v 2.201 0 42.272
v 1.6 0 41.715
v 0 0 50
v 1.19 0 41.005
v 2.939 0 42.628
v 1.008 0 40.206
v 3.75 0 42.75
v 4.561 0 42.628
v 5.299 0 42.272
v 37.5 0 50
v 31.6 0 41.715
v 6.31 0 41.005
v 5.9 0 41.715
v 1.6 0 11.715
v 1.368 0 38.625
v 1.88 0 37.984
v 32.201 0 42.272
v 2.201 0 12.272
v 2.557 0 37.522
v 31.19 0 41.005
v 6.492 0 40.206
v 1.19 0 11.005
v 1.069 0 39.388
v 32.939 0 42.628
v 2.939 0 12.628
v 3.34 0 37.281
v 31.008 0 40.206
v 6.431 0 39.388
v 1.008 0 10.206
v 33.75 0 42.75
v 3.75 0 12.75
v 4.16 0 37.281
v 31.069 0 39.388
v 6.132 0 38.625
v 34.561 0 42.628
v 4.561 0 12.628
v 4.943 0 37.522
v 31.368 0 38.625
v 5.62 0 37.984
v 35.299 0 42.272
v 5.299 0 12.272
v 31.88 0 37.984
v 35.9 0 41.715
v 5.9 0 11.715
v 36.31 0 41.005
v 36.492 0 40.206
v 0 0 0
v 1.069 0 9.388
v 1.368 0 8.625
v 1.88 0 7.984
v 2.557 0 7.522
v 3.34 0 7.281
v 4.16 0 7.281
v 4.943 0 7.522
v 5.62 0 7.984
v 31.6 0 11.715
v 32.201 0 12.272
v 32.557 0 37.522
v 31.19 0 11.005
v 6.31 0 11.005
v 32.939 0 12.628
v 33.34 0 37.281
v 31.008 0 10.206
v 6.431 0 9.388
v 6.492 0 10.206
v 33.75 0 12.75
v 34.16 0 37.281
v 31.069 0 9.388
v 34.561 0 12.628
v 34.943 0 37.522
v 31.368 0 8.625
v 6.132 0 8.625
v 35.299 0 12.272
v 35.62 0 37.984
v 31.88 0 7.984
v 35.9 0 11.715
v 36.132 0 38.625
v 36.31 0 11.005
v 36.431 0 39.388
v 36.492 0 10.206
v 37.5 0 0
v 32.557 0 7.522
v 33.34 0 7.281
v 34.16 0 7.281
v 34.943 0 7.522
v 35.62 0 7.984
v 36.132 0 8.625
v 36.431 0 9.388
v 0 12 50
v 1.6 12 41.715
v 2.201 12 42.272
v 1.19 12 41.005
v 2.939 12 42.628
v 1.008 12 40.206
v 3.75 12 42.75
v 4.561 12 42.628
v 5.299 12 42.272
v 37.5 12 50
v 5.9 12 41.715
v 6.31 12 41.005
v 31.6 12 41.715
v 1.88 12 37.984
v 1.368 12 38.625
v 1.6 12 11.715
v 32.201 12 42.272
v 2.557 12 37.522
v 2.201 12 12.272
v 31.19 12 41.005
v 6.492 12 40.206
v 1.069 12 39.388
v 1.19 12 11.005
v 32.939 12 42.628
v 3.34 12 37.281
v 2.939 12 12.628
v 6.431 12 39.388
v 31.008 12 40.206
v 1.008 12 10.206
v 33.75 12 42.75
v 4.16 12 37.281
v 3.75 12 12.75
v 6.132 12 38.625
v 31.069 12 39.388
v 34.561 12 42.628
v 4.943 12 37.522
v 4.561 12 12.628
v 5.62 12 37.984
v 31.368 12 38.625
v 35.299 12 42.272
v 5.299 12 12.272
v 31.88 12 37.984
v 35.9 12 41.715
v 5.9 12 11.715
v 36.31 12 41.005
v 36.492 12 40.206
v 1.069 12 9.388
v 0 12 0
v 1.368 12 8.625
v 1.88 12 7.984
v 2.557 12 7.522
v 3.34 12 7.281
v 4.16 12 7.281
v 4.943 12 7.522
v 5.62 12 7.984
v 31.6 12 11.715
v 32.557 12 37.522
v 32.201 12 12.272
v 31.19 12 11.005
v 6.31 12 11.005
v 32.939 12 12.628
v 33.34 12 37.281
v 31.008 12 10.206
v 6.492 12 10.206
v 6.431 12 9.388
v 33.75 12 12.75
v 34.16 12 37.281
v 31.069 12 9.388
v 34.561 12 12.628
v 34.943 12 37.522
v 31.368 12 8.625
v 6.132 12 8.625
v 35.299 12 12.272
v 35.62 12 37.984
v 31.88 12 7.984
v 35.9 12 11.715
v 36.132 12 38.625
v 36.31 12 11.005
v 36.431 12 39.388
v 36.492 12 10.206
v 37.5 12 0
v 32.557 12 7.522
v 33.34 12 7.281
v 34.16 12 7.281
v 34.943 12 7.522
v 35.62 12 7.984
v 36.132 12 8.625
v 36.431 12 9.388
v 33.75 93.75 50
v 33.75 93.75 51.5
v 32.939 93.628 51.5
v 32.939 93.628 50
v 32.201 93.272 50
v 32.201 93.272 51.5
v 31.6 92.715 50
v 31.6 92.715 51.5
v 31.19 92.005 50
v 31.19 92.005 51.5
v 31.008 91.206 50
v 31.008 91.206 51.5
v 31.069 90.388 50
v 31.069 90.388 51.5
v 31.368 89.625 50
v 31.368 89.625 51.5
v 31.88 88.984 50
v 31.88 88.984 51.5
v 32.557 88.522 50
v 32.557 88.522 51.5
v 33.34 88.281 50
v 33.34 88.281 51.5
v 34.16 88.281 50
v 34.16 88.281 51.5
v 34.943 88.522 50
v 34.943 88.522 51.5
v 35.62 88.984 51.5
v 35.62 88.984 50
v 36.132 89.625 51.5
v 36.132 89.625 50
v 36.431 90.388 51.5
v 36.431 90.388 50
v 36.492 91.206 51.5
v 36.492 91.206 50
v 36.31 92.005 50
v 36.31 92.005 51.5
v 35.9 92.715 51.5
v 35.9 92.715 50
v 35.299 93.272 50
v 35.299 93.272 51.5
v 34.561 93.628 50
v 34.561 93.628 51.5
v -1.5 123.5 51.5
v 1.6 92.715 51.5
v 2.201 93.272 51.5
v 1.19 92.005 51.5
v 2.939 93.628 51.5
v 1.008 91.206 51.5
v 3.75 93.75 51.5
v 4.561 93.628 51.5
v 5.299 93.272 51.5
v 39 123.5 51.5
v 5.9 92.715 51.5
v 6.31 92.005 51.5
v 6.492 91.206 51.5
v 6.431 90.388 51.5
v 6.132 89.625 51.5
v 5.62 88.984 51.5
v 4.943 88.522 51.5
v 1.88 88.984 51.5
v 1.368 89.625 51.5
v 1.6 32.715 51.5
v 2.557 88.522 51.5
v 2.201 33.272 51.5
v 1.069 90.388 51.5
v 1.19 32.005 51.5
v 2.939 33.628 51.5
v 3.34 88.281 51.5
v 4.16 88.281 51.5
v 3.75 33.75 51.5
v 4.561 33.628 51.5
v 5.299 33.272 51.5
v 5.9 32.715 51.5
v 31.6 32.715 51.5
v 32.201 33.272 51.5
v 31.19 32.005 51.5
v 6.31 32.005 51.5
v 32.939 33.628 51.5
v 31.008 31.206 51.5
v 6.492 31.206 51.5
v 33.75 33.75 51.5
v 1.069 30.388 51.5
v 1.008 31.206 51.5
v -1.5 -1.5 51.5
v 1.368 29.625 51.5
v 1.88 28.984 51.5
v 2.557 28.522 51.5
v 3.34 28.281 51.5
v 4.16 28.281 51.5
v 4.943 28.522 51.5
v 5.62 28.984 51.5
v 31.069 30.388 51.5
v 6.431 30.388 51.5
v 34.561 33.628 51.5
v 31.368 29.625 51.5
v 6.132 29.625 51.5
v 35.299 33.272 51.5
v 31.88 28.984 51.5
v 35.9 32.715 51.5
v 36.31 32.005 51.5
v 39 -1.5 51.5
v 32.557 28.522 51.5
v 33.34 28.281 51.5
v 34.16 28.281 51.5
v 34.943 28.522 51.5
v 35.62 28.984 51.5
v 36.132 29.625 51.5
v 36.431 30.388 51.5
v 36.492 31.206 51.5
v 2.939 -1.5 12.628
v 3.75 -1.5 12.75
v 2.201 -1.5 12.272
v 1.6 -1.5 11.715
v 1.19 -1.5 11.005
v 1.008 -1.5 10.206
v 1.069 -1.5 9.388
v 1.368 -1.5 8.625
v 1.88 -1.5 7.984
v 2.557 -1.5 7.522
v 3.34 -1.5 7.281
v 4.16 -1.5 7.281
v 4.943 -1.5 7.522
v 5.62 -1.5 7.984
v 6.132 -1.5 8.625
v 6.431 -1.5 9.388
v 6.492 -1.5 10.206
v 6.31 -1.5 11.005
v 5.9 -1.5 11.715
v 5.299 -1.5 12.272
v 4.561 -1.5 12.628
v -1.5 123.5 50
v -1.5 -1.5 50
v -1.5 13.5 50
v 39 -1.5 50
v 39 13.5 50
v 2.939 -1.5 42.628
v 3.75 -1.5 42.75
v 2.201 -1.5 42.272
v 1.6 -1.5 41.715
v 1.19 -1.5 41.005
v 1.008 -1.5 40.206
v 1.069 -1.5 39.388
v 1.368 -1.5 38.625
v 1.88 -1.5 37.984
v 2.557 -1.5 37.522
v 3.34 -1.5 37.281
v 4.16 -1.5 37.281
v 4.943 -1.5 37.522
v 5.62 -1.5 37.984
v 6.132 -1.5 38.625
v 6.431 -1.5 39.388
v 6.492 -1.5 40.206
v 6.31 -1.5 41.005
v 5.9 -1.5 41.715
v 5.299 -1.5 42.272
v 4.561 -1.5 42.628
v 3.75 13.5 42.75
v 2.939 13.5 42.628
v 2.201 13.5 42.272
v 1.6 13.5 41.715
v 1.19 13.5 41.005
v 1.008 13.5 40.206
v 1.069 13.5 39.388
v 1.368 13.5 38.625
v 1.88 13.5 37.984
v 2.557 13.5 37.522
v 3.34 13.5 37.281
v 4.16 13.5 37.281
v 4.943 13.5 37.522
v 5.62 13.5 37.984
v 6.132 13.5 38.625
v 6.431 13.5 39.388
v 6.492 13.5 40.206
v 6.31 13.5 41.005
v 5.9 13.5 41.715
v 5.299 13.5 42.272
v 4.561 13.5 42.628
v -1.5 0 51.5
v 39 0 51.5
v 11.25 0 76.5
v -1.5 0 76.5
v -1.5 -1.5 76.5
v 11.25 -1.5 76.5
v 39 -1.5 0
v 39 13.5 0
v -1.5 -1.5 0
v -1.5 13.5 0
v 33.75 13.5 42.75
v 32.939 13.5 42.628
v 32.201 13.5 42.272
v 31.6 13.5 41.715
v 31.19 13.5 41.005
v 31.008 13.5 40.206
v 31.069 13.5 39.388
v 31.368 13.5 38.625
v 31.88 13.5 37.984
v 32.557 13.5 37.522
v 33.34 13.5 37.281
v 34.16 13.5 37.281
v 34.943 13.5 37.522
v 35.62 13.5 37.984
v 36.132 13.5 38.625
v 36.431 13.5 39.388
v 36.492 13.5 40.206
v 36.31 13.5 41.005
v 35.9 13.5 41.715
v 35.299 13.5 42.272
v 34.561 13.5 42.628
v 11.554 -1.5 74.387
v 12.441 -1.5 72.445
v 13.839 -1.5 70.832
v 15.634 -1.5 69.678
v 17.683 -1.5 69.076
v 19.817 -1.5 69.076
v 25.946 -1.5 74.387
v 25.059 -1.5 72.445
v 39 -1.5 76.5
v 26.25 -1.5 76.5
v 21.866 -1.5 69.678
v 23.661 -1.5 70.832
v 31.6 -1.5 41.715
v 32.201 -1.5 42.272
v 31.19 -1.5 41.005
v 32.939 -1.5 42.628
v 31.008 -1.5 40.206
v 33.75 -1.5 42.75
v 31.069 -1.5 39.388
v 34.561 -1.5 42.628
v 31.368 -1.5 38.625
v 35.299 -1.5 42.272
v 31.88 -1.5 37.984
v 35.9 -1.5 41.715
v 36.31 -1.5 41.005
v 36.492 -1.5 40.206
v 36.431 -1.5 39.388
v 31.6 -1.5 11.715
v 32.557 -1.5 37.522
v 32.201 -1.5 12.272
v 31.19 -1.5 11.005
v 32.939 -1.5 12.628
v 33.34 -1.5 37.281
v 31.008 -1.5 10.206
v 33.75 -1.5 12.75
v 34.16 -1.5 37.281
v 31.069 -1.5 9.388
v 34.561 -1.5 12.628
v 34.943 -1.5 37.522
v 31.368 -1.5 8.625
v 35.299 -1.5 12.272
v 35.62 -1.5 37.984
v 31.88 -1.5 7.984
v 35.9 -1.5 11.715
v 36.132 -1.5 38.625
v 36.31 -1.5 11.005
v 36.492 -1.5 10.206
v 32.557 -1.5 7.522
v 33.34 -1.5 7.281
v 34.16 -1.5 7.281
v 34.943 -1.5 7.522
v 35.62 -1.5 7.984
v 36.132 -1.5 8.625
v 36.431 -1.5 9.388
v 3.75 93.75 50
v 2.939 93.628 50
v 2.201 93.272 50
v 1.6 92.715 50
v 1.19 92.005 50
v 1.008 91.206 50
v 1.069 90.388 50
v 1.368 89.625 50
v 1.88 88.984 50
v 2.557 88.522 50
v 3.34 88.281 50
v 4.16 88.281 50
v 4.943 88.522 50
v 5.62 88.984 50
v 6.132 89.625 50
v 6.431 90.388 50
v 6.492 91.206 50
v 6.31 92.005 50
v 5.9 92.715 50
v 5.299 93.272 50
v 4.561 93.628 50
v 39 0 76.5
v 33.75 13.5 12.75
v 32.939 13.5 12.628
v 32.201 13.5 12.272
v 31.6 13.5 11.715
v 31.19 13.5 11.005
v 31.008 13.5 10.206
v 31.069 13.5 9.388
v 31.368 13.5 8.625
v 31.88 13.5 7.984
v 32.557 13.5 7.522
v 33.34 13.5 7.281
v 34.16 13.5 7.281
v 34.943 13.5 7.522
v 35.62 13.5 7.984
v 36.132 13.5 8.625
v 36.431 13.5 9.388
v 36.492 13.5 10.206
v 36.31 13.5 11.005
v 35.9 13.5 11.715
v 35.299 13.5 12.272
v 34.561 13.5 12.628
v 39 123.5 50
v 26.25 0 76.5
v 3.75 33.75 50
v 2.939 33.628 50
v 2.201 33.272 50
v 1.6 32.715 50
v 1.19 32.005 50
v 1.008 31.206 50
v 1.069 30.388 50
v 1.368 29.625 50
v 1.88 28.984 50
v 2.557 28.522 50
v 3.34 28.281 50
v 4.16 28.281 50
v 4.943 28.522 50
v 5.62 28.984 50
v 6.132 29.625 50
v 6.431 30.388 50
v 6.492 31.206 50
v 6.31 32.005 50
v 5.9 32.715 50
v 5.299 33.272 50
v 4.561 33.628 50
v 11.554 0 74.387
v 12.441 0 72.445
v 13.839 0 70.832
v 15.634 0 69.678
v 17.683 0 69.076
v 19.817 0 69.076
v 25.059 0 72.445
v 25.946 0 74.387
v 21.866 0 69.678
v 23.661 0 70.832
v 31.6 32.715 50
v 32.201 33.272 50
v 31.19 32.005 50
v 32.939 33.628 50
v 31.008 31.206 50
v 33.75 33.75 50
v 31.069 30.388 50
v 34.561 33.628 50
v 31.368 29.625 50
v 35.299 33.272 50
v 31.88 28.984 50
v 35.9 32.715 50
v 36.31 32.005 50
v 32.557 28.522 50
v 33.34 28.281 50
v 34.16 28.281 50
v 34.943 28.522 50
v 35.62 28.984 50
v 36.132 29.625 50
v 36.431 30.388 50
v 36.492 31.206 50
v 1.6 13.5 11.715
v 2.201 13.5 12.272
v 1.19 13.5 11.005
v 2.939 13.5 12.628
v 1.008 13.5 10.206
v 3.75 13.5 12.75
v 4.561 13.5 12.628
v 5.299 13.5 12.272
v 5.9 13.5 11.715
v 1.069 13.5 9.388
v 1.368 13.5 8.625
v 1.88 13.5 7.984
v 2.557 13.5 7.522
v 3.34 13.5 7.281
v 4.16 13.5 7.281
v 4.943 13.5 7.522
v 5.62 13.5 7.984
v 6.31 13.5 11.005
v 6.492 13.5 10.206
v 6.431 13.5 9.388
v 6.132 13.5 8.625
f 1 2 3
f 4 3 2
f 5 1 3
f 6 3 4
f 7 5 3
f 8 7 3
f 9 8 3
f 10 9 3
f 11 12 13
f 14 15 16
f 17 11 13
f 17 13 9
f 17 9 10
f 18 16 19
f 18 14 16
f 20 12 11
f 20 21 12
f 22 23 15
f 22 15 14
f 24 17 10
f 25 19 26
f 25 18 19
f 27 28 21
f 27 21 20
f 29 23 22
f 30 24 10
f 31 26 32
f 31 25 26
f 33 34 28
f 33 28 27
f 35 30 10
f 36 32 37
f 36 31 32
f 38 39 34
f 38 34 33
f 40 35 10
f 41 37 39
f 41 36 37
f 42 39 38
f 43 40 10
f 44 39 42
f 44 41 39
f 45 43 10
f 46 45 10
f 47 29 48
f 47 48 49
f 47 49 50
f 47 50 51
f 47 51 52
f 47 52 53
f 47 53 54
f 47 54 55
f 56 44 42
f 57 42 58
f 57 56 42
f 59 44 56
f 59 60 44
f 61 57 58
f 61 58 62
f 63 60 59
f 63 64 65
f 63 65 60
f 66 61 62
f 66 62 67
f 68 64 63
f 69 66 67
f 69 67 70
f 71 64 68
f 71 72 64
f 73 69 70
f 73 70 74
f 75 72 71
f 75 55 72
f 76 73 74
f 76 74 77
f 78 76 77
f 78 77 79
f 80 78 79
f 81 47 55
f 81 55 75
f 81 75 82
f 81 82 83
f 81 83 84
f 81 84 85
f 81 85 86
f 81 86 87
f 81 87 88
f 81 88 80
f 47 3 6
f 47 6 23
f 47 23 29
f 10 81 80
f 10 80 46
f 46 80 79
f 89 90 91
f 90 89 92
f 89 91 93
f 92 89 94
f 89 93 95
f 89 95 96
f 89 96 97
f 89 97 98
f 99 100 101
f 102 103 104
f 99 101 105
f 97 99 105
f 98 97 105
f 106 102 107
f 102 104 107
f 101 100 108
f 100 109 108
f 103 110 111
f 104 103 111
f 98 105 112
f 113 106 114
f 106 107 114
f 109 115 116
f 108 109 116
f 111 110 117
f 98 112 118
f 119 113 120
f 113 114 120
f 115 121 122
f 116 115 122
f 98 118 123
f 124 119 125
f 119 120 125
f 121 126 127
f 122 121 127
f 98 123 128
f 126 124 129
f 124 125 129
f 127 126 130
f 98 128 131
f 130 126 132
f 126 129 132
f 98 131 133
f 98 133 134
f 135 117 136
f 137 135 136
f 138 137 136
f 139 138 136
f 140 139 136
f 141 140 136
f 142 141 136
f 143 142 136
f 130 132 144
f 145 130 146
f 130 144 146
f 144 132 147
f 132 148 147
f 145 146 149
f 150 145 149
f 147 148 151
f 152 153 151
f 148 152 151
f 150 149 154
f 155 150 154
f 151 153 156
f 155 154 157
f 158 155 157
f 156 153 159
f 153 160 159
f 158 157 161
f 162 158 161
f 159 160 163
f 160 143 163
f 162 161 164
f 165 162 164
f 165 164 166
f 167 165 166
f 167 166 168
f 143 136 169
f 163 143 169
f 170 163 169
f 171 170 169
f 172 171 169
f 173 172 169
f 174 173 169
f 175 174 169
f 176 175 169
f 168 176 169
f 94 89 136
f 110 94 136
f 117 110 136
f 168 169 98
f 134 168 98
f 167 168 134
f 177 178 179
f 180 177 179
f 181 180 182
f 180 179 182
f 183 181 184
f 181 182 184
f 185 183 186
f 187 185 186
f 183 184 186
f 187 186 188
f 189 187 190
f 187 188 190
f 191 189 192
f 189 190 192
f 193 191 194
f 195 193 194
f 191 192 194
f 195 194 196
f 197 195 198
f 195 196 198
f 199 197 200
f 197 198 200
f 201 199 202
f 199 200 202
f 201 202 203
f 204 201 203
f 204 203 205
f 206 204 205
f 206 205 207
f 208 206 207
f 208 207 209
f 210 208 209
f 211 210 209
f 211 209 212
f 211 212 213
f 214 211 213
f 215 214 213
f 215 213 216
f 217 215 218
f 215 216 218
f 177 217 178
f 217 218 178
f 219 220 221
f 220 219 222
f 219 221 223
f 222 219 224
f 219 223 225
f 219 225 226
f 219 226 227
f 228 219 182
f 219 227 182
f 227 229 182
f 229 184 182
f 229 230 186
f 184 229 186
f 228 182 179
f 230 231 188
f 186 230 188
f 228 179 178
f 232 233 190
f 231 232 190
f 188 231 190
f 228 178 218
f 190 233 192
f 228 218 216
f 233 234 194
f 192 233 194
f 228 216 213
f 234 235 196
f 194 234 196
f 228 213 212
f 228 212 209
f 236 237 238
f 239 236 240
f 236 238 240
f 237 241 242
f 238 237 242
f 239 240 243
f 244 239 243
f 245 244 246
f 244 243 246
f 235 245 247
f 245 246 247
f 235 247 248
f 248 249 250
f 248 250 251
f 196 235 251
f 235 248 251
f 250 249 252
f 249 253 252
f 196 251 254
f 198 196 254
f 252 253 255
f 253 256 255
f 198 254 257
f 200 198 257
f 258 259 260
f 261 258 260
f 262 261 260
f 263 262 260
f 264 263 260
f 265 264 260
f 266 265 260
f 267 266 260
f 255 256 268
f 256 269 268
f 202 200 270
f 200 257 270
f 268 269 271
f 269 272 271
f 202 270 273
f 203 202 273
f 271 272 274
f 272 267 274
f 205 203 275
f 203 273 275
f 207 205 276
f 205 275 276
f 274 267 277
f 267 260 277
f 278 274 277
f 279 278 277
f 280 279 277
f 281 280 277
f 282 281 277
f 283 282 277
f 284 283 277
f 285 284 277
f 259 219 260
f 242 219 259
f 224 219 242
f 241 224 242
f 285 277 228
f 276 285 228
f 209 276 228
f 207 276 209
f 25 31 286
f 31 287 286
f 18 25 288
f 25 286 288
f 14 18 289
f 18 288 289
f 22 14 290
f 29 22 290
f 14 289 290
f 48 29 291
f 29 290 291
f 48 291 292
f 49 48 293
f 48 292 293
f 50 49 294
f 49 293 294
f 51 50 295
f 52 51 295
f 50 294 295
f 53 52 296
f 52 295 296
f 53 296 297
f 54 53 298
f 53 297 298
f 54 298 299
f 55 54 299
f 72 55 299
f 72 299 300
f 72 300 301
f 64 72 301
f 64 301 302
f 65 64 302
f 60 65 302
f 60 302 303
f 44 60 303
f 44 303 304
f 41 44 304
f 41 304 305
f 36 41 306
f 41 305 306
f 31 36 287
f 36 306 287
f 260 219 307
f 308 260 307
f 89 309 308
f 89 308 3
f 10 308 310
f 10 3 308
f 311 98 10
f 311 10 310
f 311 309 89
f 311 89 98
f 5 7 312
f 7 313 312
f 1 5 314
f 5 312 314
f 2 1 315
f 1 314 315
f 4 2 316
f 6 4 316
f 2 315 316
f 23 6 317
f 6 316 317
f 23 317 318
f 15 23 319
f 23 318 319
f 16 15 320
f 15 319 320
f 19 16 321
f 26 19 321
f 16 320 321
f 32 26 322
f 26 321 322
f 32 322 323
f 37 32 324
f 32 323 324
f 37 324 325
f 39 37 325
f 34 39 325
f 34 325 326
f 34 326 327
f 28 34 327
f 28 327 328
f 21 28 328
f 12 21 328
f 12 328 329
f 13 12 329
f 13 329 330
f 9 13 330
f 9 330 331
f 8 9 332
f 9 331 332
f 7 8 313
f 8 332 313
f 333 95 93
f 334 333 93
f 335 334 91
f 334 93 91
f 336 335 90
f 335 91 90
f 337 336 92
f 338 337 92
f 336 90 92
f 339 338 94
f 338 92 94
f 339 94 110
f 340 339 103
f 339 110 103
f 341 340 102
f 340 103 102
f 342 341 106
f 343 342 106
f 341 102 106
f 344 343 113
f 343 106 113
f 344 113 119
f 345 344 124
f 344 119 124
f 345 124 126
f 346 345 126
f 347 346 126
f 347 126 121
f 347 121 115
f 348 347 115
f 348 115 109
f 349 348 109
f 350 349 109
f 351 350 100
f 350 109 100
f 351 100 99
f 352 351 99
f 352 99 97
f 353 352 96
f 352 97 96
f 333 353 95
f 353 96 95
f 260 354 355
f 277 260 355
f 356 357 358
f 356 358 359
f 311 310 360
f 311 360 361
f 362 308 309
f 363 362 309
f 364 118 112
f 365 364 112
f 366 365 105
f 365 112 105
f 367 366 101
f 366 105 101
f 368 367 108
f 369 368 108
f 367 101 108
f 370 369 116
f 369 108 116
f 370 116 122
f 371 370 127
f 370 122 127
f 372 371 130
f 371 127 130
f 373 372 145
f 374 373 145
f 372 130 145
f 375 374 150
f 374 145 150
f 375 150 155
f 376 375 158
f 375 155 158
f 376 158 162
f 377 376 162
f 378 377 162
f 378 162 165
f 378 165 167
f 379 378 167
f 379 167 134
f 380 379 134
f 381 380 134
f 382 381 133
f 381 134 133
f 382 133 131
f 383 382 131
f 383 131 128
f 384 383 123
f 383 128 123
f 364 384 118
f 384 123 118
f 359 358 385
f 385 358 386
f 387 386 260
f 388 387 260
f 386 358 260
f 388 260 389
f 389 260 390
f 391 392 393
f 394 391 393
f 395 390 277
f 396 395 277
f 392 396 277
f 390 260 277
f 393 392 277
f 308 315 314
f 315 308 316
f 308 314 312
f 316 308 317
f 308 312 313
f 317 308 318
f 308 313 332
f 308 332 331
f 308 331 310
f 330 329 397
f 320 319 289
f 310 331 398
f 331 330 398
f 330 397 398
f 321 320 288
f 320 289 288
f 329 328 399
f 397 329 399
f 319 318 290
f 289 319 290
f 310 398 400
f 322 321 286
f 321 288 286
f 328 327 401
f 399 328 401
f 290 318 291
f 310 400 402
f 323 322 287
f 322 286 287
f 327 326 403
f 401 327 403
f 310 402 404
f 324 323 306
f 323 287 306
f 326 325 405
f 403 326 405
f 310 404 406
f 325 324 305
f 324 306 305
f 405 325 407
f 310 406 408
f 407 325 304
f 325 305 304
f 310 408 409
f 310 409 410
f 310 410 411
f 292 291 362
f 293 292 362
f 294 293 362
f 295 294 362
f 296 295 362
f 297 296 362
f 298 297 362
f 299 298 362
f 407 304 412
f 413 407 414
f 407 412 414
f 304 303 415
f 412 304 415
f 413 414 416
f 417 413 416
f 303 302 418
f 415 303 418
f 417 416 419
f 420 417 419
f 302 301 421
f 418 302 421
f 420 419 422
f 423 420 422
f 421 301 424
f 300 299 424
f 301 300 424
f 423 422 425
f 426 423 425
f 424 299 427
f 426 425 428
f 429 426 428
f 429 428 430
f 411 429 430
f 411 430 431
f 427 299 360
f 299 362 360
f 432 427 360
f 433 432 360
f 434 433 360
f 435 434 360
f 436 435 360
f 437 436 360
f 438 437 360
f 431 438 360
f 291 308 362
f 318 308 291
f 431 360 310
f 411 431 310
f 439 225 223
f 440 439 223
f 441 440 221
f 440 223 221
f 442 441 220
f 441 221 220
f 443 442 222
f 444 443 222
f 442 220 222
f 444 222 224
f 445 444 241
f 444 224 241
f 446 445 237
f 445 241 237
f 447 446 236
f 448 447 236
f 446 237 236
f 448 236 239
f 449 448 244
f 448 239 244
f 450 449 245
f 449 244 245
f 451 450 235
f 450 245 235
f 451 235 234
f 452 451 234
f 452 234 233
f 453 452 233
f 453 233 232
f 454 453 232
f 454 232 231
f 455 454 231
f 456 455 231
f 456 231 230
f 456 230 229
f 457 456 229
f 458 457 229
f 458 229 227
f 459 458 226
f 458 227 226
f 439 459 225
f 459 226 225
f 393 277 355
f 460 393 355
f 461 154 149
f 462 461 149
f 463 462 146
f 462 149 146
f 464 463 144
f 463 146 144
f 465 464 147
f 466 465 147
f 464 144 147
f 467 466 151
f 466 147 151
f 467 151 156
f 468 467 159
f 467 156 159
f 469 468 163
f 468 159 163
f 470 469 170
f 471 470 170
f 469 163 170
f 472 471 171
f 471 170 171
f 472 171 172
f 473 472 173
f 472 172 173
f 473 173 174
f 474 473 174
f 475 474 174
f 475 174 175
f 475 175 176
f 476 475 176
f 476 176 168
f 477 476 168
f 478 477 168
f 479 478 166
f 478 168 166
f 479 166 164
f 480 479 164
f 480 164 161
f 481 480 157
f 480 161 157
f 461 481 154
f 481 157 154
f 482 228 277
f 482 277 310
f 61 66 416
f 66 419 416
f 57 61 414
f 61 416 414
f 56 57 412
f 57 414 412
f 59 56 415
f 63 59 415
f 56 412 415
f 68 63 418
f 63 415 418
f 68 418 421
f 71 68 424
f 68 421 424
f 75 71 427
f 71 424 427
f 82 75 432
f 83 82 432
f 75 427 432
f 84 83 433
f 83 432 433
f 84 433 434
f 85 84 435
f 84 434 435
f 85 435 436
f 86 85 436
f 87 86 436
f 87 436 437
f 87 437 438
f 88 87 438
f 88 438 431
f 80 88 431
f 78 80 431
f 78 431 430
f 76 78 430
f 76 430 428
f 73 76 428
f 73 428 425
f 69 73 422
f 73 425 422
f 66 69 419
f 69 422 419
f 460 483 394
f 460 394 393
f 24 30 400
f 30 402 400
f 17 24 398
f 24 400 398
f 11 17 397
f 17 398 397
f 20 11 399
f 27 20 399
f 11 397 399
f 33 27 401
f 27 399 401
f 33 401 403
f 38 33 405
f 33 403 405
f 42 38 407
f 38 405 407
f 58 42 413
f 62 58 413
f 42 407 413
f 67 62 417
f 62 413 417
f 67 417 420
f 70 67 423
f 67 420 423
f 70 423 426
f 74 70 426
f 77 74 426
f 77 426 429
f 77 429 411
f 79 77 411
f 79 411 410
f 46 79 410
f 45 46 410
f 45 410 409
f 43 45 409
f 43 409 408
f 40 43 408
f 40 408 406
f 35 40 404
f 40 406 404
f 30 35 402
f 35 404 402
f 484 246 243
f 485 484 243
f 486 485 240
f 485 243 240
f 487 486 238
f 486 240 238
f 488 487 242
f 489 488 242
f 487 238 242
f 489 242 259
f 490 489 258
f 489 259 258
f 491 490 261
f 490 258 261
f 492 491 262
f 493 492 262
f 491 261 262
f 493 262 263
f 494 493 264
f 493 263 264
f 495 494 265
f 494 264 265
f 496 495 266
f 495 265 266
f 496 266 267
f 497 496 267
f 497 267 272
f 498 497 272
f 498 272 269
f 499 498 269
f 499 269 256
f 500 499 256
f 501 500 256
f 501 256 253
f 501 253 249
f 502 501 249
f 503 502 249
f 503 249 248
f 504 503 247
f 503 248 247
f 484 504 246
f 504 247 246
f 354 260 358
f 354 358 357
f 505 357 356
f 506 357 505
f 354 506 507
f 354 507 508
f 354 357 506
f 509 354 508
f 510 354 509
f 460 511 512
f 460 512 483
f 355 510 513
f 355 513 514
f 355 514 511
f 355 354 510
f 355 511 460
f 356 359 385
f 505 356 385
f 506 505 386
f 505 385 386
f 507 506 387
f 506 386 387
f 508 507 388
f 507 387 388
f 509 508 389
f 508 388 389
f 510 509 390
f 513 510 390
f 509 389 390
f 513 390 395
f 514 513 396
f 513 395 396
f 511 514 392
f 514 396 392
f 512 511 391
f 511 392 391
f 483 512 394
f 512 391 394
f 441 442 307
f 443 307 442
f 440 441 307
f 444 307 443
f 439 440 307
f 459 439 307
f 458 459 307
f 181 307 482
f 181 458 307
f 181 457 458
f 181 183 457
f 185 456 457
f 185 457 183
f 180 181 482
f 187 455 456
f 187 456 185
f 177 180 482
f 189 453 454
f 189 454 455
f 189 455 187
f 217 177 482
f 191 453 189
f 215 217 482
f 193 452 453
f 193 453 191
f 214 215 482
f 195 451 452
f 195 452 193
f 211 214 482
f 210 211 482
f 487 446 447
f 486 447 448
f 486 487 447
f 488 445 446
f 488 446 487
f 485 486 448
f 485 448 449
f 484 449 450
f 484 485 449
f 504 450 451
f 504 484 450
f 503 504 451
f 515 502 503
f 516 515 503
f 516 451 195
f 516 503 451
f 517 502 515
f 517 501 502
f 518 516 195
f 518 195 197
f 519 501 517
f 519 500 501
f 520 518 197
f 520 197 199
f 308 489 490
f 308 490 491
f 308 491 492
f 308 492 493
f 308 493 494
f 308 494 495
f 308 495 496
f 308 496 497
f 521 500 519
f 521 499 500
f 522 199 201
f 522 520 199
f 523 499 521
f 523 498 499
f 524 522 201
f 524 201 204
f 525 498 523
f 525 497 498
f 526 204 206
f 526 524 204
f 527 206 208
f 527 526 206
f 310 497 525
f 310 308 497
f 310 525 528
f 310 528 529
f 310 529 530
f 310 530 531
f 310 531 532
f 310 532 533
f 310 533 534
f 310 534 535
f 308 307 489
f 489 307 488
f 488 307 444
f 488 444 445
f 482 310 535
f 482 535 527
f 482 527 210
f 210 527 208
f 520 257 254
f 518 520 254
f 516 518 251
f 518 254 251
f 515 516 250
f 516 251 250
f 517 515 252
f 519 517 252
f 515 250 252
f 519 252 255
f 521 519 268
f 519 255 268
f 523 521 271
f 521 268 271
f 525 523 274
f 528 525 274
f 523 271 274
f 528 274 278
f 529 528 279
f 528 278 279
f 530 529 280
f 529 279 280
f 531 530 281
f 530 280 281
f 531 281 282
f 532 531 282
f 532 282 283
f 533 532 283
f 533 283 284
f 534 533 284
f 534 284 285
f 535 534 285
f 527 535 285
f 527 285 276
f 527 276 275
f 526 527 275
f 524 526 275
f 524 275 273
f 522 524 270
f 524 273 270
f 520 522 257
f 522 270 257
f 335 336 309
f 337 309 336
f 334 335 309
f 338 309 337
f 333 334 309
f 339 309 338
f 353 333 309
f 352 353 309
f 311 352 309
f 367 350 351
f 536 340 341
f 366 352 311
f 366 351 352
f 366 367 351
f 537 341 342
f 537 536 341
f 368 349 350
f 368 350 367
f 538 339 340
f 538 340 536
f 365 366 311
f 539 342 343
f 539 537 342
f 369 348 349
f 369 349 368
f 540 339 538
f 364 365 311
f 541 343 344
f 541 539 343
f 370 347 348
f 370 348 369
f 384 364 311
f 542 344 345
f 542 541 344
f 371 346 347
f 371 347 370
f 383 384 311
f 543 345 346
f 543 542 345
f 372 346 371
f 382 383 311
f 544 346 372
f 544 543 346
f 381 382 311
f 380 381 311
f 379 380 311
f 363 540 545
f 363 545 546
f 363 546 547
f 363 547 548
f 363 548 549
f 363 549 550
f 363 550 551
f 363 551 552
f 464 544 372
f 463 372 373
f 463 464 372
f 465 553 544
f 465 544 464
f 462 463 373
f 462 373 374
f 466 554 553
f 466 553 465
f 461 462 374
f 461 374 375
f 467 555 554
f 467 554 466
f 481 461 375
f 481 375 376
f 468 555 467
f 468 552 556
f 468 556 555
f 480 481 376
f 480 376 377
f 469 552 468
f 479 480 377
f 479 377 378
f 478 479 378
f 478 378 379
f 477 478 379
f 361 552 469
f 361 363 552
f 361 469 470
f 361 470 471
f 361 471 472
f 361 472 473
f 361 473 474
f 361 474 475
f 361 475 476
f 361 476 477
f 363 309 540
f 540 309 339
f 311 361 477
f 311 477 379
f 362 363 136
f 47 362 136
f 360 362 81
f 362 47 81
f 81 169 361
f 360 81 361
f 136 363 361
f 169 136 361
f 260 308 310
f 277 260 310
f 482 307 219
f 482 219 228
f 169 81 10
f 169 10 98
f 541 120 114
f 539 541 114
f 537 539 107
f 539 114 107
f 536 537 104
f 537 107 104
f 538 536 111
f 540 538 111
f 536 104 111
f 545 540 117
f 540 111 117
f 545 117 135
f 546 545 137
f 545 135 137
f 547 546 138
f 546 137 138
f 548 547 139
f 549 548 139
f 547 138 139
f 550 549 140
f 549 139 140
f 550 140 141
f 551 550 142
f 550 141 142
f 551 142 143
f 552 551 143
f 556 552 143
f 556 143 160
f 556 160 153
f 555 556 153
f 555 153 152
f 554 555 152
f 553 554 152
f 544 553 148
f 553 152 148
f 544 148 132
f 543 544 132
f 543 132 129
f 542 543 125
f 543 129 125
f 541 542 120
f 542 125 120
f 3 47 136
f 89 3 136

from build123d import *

# Parameters (mm, degrees)
SKETCH2_W                       = 40.5
SKETCH2_H                       = 15
SKETCH2_W_2                     = 37.5
SKETCH2_H_2                     = 12
TUBE_CANTILEVER_DEPTH           = 50
SKETCH4_W                       = 40.5
SKETCH4_H                       = 1.5
FLANGE_LEG_DEPTH                = 125
SKETCH5_W                       = 40.5
SKETCH5_H                       = 1.5
BOTTOM_LEG_DEPTH                = 25
SKETCH6_R                       = 7.5
LEADSCREW_CLEARANCE_DEPTH       = 25
SKETCH8_W                       = 2.75
SKETCH8_H                       = 15
DESKTOP_HOLE_PATTERN_AT_2_COUNT = 2
DESKTOP_HOLE_PATTERN_AT_2_PITCH = 42.426406871
DESKTOP_HOLE_PATTERN_AT_3_COUNT = 2
DESKTOP_HOLE_PATTERN_AT_3_PITCH = 30
DESKTOP_HOLE_PATTERN_AT_4_COUNT = 2
DESKTOP_HOLE_PATTERN_AT_4_PITCH = 30
SKETCH10_W                      = 2.75
SKETCH10_H                      = 26.5
BEARING_HOLE_PATTERN_AT_2_COUNT = 2
BEARING_HOLE_PATTERN_AT_2_PITCH = 67.082039325
BEARING_HOLE_PATTERN_AT_3_COUNT = 2
BEARING_HOLE_PATTERN_AT_3_PITCH = 60
BEARING_HOLE_PATTERN_AT_4_COUNT = 2
BEARING_HOLE_PATTERN_AT_4_PITCH = 30


with BuildPart() as part:
    # Sketch2 → tube cantilever (new body)
    with BuildSketch(Plane.XY):
        with Locations((18.75, 6)):
            Rectangle(SKETCH2_W, SKETCH2_H)
        with Locations((18.75, 6)):
            Rectangle(SKETCH2_W_2, SKETCH2_H_2, mode=Mode.SUBTRACT)
    extrude(amount=TUBE_CANTILEVER_DEPTH)

    # Sketch8 → desktop hole pattern (revolve, cut)
    with BuildSketch(Plane(origin=(3.75, 13.5, 10), x_dir=(0, 0, 1), z_dir=(1, 0, 0))):
        with Locations((1.375, 7.5)):
            Rectangle(SKETCH8_W, SKETCH8_H)
    desktop_hole_pattern = revolve(axis=Axis((3.75, 19.85, 10), (0, -1, 0)), mode=Mode.SUBTRACT)

    # desktop hole pattern at 2: desktop hole pattern ×2
    with Locations(*[Vector(0.7071067811865475, 0, 0.7071067811865477) * (i * DESKTOP_HOLE_PATTERN_AT_2_PITCH) for i in range(1, DESKTOP_HOLE_PATTERN_AT_2_COUNT)]):
        add(desktop_hole_pattern, mode=Mode.SUBTRACT)

    # desktop hole pattern at 3: desktop hole pattern ×2
    with Locations(*[(0, 0, i * DESKTOP_HOLE_PATTERN_AT_3_PITCH) for i in range(1, DESKTOP_HOLE_PATTERN_AT_3_COUNT)]):
        add(desktop_hole_pattern, mode=Mode.SUBTRACT)

    # desktop hole pattern at 4: desktop hole pattern ×2
    with Locations(*[(i * DESKTOP_HOLE_PATTERN_AT_4_PITCH, 0, 0) for i in range(1, DESKTOP_HOLE_PATTERN_AT_4_COUNT)]):
        add(desktop_hole_pattern, mode=Mode.SUBTRACT)


with BuildPart() as body_2:
    # Sketch4 → flange leg (new body)
    with BuildSketch(Plane(origin=(0, -1.5, 0), x_dir=(1, 0, 0), z_dir=(0, 1, 0))):
        with Locations((18.75, -50.75)):
            Rectangle(SKETCH4_W, SKETCH4_H)
    extrude(amount=FLANGE_LEG_DEPTH)

    # Sketch10 → bearing hole pattern (revolve, cut)
    with BuildSketch(Plane(origin=(33.75, 91, 50), x_dir=(0, 1, 0), z_dir=(1, 0, 0))):
        with Locations((1.375, 13.25)):
            Rectangle(SKETCH10_W, SKETCH10_H)
    bearing_hole_pattern = revolve(axis=Axis((33.75, 91, 43.65), (0, 0, 1)), mode=Mode.SUBTRACT)

    # bearing hole pattern at 2: bearing hole pattern ×2
    with Locations(*[Vector(-0.447213595499958, -0.894427190999916, 0) * (i * BEARING_HOLE_PATTERN_AT_2_PITCH) for i in range(1, BEARING_HOLE_PATTERN_AT_2_COUNT)]):
        add(bearing_hole_pattern, mode=Mode.SUBTRACT)

    # bearing hole pattern at 3: bearing hole pattern ×2
    with Locations(*[(0, -i * BEARING_HOLE_PATTERN_AT_3_PITCH, 0) for i in range(1, BEARING_HOLE_PATTERN_AT_3_COUNT)]):
        add(bearing_hole_pattern, mode=Mode.SUBTRACT)

    # bearing hole pattern at 4: bearing hole pattern ×2
    with Locations(*[(-i * BEARING_HOLE_PATTERN_AT_4_PITCH, 0, 0) for i in range(1, BEARING_HOLE_PATTERN_AT_4_COUNT)]):
        add(bearing_hole_pattern, mode=Mode.SUBTRACT)


with BuildPart() as body_3:
    # Sketch5 → bottom leg (new body)
    with BuildSketch(Plane.XY.offset(51.5)):
        with Locations((18.75, -0.75)):
            Rectangle(SKETCH5_W, SKETCH5_H)
    extrude(amount=BOTTOM_LEG_DEPTH)

    # Sketch6 → leadscrew clearance (cut)
    with BuildSketch(Plane.XZ.offset(1.5)):
        with Locations((18.75, 76.5)):
            Circle(SKETCH6_R)
    extrude(amount=-LEADSCREW_CLEARANCE_DEPTH, mode=Mode.SUBTRACT)


solid = Compound([part.part, body_2.part, body_3.part])
